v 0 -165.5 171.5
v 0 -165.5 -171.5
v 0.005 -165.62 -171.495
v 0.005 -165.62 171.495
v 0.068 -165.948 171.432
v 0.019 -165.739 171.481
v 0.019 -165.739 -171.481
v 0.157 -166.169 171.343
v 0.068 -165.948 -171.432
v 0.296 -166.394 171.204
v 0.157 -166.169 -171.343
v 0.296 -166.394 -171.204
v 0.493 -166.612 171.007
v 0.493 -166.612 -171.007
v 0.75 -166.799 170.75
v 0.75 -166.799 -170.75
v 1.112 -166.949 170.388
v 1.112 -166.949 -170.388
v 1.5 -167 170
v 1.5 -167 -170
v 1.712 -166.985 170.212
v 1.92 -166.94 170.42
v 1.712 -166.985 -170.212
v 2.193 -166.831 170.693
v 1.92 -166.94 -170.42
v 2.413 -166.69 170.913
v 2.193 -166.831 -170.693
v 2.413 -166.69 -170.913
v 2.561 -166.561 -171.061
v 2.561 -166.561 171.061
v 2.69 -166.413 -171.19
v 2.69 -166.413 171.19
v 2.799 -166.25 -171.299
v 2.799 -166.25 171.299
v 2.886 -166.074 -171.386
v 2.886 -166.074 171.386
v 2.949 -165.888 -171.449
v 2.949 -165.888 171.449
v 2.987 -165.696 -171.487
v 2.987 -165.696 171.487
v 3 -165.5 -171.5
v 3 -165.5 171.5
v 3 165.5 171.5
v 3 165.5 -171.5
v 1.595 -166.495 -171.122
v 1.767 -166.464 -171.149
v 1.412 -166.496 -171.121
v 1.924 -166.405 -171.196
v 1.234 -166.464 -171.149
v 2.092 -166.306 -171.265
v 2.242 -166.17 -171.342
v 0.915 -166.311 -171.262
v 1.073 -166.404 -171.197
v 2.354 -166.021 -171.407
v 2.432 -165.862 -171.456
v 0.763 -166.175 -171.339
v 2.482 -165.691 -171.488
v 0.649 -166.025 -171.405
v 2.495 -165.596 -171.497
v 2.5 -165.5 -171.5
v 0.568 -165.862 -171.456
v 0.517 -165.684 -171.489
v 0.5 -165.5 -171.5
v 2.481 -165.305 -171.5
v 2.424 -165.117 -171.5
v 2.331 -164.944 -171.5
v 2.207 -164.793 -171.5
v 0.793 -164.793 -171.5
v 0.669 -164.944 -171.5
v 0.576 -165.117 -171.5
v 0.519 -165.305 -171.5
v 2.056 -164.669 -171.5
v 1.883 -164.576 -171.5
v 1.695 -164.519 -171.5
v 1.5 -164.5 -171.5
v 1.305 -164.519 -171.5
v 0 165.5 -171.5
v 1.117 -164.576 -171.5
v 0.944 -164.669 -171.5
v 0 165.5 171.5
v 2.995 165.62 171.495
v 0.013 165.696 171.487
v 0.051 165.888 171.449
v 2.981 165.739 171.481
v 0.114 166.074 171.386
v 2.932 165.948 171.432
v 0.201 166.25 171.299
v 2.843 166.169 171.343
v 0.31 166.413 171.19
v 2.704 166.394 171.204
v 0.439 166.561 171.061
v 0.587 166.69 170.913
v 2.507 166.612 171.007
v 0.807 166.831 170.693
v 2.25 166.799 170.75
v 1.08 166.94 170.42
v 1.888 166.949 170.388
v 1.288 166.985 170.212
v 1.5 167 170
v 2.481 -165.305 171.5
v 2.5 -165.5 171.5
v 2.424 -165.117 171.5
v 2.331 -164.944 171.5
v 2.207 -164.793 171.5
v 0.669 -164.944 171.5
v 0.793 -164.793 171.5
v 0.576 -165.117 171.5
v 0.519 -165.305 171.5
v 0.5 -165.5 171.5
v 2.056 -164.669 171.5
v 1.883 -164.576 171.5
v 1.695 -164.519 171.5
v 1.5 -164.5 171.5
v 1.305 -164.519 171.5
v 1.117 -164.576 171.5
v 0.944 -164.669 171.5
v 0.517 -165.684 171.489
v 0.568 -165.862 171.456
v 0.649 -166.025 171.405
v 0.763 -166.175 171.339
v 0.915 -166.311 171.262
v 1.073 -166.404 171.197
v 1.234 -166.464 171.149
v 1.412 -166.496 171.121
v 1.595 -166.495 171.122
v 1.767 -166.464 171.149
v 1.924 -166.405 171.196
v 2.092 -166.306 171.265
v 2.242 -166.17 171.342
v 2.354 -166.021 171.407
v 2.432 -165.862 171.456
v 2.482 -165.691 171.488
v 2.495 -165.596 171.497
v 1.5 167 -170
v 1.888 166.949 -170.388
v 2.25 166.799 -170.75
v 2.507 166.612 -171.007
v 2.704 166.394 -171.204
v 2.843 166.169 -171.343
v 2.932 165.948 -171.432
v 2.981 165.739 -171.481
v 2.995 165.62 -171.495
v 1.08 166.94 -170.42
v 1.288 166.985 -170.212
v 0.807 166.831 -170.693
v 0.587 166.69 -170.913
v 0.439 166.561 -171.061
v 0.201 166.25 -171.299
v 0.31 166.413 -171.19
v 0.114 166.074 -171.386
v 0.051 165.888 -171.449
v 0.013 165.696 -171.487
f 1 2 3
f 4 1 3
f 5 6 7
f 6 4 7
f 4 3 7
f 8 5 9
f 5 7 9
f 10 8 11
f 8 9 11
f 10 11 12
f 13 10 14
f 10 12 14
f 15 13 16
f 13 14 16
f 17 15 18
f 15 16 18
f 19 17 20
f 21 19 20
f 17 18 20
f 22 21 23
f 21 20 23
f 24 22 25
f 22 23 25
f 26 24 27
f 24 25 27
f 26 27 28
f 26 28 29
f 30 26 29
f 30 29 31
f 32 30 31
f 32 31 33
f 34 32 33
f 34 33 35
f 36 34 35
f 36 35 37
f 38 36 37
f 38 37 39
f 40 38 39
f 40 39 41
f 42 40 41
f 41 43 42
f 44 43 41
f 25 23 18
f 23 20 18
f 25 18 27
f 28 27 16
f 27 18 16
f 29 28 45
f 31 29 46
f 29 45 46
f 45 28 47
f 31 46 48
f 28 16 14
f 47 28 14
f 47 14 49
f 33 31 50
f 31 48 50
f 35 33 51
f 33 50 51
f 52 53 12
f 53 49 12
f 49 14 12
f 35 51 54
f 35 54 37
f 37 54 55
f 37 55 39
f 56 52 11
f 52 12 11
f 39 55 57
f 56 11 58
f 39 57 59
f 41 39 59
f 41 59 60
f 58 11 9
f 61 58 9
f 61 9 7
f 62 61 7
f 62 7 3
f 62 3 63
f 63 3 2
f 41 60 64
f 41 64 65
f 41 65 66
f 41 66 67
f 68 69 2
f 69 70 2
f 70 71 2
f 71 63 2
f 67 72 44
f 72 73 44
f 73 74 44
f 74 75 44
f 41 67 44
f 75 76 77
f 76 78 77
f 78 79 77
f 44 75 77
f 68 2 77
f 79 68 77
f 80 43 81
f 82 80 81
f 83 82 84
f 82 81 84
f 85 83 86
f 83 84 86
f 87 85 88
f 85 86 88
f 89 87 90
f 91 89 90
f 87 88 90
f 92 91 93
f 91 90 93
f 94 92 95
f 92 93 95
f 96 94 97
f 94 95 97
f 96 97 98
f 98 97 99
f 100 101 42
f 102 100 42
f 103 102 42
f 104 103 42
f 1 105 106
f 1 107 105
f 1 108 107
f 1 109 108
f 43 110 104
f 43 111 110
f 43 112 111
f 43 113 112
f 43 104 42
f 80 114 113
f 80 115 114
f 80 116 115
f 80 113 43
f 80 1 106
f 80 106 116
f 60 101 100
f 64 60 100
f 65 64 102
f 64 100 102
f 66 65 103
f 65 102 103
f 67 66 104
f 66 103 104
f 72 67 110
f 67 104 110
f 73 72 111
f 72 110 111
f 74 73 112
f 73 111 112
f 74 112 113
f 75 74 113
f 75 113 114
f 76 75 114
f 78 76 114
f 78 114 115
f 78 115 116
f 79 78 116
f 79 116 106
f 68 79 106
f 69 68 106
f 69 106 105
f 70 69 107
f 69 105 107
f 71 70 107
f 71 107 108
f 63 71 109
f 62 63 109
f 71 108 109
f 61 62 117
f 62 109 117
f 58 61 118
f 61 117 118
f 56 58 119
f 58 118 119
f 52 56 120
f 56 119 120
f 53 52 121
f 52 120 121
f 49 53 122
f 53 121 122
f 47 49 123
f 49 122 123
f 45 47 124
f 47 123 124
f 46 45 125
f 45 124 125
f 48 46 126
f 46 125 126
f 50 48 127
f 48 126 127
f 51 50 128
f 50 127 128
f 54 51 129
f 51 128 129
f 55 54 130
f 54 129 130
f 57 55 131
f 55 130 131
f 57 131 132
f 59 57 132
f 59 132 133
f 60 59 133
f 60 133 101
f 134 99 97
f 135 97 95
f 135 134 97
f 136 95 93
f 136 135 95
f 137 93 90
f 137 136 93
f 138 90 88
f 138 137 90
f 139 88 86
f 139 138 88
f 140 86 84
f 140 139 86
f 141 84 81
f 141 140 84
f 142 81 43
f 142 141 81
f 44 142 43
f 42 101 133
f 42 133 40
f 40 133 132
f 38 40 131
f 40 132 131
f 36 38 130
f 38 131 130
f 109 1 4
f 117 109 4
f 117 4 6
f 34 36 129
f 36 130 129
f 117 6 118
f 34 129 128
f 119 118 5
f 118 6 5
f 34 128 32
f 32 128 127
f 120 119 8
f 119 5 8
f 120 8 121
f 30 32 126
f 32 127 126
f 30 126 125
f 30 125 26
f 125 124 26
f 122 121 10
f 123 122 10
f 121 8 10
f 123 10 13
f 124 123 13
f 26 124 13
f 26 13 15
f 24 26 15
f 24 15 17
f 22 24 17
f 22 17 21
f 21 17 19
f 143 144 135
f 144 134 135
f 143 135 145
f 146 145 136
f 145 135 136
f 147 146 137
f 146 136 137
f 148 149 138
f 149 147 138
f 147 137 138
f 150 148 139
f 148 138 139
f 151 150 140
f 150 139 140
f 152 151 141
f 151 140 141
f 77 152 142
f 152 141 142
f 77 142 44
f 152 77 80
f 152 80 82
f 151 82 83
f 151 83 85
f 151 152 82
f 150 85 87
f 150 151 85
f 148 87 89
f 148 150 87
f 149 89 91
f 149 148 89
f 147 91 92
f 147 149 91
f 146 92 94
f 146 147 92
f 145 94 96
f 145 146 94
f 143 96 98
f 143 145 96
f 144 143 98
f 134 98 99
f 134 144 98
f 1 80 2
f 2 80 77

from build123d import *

# Parameters (mm, degrees)
SKETCH_1_W          = 343
SKETCH_1_H          = 334
EXTRUDE_1_DEPTH     = 3
SKETCH_3_R          = 1
CUT_EXTRUDE_1_DEPTH = 382.506225375
FILLET_1_R          = 1.5
FILLET_2_R          = 1.5


# Some blends are built 0.0001 mm under size
with BuildPart() as part:
    # 草图1 → 凸台-拉伸1 (new body)
    with BuildSketch(Plane(origin=(0, 0, 0), x_dir=(0, 0, -1), z_dir=(1, 0, 0))):
        Rectangle(SKETCH_1_W, SKETCH_1_H)
    extrude(amount=EXTRUDE_1_DEPTH)

    # 草图3 → 切除-拉伸1 (cut, through all)
    with BuildSketch(Plane.XY.offset(171.5)):
        with Locations((1.5, -165.5)):
            Circle(SKETCH_3_R)
    extrude(amount=-CUT_EXTRUDE_1_DEPTH, mode=Mode.SUBTRACT)

    # 圆角1
    # the kernel refuses this fillet: 1.5 mm, written as the material it takes off along each edge
    with BuildSketch(Plane(origin=(3, -167, -175.25), x_dir=(0, 1, 0), z_dir=(0, 0, 1))) as fillet_1_piece_1:
        with BuildLine():
            CenterArc((FILLET_1_R, FILLET_1_R), FILLET_1_R, 180, 90)
            Line((0, FILLET_1_R), (0, 0))
            Line((0, 0), (FILLET_1_R, 0))
        make_face()
    extrude(amount=350.5, mode=Mode.SUBTRACT)
    with BuildSketch(Plane(origin=(0, -167, -175.25), x_dir=(0, 1, 0), z_dir=(0, 0, 1))) as fillet_1_piece_2:
        with BuildLine():
            CenterArc((FILLET_1_R, -FILLET_1_R), FILLET_1_R, 90, 90)
            Line((0, -FILLET_1_R), (0, 0))
            Line((0, 0), (FILLET_1_R, 0))
        make_face()
    extrude(amount=350.5, mode=Mode.SUBTRACT)
    with BuildSketch(Plane(origin=(-3.75, -167, -171.5), x_dir=(0, 1, 0), z_dir=(1, 0, 0))) as fillet_1_piece_3:
        with BuildLine():
            CenterArc((FILLET_1_R, FILLET_1_R), FILLET_1_R, 180, 90)
            Line((0, FILLET_1_R), (0, 0))
            Line((0, 0), (FILLET_1_R, 0))
        make_face()
    extrude(amount=10.5, mode=Mode.SUBTRACT)
    with BuildSketch(Plane(origin=(-3.75, -167, 171.5), x_dir=(0, 1, 0), z_dir=(1, 0, 0))) as fillet_1_piece_4:
        with BuildLine():
            CenterArc((FILLET_1_R, -FILLET_1_R), FILLET_1_R, 90, 90)
            Line((0, -FILLET_1_R), (0, 0))
            Line((0, 0), (FILLET_1_R, 0))
        make_face()
    extrude(amount=10.5, mode=Mode.SUBTRACT)

    # 圆角2
    fillet_2_edges = [part.edges().sort_by_distance(p)[0] for p in [
        (0, 167, 0),
        (3, 167, 0),
        (1.5, 167, 171.5),
        (1.5, 167, -171.5),
    ]]
    fillet(fillet_2_edges, radius=FILLET_2_R - 0.0001)  # a hair under: the kernel refuses the full size


solid = part.part
